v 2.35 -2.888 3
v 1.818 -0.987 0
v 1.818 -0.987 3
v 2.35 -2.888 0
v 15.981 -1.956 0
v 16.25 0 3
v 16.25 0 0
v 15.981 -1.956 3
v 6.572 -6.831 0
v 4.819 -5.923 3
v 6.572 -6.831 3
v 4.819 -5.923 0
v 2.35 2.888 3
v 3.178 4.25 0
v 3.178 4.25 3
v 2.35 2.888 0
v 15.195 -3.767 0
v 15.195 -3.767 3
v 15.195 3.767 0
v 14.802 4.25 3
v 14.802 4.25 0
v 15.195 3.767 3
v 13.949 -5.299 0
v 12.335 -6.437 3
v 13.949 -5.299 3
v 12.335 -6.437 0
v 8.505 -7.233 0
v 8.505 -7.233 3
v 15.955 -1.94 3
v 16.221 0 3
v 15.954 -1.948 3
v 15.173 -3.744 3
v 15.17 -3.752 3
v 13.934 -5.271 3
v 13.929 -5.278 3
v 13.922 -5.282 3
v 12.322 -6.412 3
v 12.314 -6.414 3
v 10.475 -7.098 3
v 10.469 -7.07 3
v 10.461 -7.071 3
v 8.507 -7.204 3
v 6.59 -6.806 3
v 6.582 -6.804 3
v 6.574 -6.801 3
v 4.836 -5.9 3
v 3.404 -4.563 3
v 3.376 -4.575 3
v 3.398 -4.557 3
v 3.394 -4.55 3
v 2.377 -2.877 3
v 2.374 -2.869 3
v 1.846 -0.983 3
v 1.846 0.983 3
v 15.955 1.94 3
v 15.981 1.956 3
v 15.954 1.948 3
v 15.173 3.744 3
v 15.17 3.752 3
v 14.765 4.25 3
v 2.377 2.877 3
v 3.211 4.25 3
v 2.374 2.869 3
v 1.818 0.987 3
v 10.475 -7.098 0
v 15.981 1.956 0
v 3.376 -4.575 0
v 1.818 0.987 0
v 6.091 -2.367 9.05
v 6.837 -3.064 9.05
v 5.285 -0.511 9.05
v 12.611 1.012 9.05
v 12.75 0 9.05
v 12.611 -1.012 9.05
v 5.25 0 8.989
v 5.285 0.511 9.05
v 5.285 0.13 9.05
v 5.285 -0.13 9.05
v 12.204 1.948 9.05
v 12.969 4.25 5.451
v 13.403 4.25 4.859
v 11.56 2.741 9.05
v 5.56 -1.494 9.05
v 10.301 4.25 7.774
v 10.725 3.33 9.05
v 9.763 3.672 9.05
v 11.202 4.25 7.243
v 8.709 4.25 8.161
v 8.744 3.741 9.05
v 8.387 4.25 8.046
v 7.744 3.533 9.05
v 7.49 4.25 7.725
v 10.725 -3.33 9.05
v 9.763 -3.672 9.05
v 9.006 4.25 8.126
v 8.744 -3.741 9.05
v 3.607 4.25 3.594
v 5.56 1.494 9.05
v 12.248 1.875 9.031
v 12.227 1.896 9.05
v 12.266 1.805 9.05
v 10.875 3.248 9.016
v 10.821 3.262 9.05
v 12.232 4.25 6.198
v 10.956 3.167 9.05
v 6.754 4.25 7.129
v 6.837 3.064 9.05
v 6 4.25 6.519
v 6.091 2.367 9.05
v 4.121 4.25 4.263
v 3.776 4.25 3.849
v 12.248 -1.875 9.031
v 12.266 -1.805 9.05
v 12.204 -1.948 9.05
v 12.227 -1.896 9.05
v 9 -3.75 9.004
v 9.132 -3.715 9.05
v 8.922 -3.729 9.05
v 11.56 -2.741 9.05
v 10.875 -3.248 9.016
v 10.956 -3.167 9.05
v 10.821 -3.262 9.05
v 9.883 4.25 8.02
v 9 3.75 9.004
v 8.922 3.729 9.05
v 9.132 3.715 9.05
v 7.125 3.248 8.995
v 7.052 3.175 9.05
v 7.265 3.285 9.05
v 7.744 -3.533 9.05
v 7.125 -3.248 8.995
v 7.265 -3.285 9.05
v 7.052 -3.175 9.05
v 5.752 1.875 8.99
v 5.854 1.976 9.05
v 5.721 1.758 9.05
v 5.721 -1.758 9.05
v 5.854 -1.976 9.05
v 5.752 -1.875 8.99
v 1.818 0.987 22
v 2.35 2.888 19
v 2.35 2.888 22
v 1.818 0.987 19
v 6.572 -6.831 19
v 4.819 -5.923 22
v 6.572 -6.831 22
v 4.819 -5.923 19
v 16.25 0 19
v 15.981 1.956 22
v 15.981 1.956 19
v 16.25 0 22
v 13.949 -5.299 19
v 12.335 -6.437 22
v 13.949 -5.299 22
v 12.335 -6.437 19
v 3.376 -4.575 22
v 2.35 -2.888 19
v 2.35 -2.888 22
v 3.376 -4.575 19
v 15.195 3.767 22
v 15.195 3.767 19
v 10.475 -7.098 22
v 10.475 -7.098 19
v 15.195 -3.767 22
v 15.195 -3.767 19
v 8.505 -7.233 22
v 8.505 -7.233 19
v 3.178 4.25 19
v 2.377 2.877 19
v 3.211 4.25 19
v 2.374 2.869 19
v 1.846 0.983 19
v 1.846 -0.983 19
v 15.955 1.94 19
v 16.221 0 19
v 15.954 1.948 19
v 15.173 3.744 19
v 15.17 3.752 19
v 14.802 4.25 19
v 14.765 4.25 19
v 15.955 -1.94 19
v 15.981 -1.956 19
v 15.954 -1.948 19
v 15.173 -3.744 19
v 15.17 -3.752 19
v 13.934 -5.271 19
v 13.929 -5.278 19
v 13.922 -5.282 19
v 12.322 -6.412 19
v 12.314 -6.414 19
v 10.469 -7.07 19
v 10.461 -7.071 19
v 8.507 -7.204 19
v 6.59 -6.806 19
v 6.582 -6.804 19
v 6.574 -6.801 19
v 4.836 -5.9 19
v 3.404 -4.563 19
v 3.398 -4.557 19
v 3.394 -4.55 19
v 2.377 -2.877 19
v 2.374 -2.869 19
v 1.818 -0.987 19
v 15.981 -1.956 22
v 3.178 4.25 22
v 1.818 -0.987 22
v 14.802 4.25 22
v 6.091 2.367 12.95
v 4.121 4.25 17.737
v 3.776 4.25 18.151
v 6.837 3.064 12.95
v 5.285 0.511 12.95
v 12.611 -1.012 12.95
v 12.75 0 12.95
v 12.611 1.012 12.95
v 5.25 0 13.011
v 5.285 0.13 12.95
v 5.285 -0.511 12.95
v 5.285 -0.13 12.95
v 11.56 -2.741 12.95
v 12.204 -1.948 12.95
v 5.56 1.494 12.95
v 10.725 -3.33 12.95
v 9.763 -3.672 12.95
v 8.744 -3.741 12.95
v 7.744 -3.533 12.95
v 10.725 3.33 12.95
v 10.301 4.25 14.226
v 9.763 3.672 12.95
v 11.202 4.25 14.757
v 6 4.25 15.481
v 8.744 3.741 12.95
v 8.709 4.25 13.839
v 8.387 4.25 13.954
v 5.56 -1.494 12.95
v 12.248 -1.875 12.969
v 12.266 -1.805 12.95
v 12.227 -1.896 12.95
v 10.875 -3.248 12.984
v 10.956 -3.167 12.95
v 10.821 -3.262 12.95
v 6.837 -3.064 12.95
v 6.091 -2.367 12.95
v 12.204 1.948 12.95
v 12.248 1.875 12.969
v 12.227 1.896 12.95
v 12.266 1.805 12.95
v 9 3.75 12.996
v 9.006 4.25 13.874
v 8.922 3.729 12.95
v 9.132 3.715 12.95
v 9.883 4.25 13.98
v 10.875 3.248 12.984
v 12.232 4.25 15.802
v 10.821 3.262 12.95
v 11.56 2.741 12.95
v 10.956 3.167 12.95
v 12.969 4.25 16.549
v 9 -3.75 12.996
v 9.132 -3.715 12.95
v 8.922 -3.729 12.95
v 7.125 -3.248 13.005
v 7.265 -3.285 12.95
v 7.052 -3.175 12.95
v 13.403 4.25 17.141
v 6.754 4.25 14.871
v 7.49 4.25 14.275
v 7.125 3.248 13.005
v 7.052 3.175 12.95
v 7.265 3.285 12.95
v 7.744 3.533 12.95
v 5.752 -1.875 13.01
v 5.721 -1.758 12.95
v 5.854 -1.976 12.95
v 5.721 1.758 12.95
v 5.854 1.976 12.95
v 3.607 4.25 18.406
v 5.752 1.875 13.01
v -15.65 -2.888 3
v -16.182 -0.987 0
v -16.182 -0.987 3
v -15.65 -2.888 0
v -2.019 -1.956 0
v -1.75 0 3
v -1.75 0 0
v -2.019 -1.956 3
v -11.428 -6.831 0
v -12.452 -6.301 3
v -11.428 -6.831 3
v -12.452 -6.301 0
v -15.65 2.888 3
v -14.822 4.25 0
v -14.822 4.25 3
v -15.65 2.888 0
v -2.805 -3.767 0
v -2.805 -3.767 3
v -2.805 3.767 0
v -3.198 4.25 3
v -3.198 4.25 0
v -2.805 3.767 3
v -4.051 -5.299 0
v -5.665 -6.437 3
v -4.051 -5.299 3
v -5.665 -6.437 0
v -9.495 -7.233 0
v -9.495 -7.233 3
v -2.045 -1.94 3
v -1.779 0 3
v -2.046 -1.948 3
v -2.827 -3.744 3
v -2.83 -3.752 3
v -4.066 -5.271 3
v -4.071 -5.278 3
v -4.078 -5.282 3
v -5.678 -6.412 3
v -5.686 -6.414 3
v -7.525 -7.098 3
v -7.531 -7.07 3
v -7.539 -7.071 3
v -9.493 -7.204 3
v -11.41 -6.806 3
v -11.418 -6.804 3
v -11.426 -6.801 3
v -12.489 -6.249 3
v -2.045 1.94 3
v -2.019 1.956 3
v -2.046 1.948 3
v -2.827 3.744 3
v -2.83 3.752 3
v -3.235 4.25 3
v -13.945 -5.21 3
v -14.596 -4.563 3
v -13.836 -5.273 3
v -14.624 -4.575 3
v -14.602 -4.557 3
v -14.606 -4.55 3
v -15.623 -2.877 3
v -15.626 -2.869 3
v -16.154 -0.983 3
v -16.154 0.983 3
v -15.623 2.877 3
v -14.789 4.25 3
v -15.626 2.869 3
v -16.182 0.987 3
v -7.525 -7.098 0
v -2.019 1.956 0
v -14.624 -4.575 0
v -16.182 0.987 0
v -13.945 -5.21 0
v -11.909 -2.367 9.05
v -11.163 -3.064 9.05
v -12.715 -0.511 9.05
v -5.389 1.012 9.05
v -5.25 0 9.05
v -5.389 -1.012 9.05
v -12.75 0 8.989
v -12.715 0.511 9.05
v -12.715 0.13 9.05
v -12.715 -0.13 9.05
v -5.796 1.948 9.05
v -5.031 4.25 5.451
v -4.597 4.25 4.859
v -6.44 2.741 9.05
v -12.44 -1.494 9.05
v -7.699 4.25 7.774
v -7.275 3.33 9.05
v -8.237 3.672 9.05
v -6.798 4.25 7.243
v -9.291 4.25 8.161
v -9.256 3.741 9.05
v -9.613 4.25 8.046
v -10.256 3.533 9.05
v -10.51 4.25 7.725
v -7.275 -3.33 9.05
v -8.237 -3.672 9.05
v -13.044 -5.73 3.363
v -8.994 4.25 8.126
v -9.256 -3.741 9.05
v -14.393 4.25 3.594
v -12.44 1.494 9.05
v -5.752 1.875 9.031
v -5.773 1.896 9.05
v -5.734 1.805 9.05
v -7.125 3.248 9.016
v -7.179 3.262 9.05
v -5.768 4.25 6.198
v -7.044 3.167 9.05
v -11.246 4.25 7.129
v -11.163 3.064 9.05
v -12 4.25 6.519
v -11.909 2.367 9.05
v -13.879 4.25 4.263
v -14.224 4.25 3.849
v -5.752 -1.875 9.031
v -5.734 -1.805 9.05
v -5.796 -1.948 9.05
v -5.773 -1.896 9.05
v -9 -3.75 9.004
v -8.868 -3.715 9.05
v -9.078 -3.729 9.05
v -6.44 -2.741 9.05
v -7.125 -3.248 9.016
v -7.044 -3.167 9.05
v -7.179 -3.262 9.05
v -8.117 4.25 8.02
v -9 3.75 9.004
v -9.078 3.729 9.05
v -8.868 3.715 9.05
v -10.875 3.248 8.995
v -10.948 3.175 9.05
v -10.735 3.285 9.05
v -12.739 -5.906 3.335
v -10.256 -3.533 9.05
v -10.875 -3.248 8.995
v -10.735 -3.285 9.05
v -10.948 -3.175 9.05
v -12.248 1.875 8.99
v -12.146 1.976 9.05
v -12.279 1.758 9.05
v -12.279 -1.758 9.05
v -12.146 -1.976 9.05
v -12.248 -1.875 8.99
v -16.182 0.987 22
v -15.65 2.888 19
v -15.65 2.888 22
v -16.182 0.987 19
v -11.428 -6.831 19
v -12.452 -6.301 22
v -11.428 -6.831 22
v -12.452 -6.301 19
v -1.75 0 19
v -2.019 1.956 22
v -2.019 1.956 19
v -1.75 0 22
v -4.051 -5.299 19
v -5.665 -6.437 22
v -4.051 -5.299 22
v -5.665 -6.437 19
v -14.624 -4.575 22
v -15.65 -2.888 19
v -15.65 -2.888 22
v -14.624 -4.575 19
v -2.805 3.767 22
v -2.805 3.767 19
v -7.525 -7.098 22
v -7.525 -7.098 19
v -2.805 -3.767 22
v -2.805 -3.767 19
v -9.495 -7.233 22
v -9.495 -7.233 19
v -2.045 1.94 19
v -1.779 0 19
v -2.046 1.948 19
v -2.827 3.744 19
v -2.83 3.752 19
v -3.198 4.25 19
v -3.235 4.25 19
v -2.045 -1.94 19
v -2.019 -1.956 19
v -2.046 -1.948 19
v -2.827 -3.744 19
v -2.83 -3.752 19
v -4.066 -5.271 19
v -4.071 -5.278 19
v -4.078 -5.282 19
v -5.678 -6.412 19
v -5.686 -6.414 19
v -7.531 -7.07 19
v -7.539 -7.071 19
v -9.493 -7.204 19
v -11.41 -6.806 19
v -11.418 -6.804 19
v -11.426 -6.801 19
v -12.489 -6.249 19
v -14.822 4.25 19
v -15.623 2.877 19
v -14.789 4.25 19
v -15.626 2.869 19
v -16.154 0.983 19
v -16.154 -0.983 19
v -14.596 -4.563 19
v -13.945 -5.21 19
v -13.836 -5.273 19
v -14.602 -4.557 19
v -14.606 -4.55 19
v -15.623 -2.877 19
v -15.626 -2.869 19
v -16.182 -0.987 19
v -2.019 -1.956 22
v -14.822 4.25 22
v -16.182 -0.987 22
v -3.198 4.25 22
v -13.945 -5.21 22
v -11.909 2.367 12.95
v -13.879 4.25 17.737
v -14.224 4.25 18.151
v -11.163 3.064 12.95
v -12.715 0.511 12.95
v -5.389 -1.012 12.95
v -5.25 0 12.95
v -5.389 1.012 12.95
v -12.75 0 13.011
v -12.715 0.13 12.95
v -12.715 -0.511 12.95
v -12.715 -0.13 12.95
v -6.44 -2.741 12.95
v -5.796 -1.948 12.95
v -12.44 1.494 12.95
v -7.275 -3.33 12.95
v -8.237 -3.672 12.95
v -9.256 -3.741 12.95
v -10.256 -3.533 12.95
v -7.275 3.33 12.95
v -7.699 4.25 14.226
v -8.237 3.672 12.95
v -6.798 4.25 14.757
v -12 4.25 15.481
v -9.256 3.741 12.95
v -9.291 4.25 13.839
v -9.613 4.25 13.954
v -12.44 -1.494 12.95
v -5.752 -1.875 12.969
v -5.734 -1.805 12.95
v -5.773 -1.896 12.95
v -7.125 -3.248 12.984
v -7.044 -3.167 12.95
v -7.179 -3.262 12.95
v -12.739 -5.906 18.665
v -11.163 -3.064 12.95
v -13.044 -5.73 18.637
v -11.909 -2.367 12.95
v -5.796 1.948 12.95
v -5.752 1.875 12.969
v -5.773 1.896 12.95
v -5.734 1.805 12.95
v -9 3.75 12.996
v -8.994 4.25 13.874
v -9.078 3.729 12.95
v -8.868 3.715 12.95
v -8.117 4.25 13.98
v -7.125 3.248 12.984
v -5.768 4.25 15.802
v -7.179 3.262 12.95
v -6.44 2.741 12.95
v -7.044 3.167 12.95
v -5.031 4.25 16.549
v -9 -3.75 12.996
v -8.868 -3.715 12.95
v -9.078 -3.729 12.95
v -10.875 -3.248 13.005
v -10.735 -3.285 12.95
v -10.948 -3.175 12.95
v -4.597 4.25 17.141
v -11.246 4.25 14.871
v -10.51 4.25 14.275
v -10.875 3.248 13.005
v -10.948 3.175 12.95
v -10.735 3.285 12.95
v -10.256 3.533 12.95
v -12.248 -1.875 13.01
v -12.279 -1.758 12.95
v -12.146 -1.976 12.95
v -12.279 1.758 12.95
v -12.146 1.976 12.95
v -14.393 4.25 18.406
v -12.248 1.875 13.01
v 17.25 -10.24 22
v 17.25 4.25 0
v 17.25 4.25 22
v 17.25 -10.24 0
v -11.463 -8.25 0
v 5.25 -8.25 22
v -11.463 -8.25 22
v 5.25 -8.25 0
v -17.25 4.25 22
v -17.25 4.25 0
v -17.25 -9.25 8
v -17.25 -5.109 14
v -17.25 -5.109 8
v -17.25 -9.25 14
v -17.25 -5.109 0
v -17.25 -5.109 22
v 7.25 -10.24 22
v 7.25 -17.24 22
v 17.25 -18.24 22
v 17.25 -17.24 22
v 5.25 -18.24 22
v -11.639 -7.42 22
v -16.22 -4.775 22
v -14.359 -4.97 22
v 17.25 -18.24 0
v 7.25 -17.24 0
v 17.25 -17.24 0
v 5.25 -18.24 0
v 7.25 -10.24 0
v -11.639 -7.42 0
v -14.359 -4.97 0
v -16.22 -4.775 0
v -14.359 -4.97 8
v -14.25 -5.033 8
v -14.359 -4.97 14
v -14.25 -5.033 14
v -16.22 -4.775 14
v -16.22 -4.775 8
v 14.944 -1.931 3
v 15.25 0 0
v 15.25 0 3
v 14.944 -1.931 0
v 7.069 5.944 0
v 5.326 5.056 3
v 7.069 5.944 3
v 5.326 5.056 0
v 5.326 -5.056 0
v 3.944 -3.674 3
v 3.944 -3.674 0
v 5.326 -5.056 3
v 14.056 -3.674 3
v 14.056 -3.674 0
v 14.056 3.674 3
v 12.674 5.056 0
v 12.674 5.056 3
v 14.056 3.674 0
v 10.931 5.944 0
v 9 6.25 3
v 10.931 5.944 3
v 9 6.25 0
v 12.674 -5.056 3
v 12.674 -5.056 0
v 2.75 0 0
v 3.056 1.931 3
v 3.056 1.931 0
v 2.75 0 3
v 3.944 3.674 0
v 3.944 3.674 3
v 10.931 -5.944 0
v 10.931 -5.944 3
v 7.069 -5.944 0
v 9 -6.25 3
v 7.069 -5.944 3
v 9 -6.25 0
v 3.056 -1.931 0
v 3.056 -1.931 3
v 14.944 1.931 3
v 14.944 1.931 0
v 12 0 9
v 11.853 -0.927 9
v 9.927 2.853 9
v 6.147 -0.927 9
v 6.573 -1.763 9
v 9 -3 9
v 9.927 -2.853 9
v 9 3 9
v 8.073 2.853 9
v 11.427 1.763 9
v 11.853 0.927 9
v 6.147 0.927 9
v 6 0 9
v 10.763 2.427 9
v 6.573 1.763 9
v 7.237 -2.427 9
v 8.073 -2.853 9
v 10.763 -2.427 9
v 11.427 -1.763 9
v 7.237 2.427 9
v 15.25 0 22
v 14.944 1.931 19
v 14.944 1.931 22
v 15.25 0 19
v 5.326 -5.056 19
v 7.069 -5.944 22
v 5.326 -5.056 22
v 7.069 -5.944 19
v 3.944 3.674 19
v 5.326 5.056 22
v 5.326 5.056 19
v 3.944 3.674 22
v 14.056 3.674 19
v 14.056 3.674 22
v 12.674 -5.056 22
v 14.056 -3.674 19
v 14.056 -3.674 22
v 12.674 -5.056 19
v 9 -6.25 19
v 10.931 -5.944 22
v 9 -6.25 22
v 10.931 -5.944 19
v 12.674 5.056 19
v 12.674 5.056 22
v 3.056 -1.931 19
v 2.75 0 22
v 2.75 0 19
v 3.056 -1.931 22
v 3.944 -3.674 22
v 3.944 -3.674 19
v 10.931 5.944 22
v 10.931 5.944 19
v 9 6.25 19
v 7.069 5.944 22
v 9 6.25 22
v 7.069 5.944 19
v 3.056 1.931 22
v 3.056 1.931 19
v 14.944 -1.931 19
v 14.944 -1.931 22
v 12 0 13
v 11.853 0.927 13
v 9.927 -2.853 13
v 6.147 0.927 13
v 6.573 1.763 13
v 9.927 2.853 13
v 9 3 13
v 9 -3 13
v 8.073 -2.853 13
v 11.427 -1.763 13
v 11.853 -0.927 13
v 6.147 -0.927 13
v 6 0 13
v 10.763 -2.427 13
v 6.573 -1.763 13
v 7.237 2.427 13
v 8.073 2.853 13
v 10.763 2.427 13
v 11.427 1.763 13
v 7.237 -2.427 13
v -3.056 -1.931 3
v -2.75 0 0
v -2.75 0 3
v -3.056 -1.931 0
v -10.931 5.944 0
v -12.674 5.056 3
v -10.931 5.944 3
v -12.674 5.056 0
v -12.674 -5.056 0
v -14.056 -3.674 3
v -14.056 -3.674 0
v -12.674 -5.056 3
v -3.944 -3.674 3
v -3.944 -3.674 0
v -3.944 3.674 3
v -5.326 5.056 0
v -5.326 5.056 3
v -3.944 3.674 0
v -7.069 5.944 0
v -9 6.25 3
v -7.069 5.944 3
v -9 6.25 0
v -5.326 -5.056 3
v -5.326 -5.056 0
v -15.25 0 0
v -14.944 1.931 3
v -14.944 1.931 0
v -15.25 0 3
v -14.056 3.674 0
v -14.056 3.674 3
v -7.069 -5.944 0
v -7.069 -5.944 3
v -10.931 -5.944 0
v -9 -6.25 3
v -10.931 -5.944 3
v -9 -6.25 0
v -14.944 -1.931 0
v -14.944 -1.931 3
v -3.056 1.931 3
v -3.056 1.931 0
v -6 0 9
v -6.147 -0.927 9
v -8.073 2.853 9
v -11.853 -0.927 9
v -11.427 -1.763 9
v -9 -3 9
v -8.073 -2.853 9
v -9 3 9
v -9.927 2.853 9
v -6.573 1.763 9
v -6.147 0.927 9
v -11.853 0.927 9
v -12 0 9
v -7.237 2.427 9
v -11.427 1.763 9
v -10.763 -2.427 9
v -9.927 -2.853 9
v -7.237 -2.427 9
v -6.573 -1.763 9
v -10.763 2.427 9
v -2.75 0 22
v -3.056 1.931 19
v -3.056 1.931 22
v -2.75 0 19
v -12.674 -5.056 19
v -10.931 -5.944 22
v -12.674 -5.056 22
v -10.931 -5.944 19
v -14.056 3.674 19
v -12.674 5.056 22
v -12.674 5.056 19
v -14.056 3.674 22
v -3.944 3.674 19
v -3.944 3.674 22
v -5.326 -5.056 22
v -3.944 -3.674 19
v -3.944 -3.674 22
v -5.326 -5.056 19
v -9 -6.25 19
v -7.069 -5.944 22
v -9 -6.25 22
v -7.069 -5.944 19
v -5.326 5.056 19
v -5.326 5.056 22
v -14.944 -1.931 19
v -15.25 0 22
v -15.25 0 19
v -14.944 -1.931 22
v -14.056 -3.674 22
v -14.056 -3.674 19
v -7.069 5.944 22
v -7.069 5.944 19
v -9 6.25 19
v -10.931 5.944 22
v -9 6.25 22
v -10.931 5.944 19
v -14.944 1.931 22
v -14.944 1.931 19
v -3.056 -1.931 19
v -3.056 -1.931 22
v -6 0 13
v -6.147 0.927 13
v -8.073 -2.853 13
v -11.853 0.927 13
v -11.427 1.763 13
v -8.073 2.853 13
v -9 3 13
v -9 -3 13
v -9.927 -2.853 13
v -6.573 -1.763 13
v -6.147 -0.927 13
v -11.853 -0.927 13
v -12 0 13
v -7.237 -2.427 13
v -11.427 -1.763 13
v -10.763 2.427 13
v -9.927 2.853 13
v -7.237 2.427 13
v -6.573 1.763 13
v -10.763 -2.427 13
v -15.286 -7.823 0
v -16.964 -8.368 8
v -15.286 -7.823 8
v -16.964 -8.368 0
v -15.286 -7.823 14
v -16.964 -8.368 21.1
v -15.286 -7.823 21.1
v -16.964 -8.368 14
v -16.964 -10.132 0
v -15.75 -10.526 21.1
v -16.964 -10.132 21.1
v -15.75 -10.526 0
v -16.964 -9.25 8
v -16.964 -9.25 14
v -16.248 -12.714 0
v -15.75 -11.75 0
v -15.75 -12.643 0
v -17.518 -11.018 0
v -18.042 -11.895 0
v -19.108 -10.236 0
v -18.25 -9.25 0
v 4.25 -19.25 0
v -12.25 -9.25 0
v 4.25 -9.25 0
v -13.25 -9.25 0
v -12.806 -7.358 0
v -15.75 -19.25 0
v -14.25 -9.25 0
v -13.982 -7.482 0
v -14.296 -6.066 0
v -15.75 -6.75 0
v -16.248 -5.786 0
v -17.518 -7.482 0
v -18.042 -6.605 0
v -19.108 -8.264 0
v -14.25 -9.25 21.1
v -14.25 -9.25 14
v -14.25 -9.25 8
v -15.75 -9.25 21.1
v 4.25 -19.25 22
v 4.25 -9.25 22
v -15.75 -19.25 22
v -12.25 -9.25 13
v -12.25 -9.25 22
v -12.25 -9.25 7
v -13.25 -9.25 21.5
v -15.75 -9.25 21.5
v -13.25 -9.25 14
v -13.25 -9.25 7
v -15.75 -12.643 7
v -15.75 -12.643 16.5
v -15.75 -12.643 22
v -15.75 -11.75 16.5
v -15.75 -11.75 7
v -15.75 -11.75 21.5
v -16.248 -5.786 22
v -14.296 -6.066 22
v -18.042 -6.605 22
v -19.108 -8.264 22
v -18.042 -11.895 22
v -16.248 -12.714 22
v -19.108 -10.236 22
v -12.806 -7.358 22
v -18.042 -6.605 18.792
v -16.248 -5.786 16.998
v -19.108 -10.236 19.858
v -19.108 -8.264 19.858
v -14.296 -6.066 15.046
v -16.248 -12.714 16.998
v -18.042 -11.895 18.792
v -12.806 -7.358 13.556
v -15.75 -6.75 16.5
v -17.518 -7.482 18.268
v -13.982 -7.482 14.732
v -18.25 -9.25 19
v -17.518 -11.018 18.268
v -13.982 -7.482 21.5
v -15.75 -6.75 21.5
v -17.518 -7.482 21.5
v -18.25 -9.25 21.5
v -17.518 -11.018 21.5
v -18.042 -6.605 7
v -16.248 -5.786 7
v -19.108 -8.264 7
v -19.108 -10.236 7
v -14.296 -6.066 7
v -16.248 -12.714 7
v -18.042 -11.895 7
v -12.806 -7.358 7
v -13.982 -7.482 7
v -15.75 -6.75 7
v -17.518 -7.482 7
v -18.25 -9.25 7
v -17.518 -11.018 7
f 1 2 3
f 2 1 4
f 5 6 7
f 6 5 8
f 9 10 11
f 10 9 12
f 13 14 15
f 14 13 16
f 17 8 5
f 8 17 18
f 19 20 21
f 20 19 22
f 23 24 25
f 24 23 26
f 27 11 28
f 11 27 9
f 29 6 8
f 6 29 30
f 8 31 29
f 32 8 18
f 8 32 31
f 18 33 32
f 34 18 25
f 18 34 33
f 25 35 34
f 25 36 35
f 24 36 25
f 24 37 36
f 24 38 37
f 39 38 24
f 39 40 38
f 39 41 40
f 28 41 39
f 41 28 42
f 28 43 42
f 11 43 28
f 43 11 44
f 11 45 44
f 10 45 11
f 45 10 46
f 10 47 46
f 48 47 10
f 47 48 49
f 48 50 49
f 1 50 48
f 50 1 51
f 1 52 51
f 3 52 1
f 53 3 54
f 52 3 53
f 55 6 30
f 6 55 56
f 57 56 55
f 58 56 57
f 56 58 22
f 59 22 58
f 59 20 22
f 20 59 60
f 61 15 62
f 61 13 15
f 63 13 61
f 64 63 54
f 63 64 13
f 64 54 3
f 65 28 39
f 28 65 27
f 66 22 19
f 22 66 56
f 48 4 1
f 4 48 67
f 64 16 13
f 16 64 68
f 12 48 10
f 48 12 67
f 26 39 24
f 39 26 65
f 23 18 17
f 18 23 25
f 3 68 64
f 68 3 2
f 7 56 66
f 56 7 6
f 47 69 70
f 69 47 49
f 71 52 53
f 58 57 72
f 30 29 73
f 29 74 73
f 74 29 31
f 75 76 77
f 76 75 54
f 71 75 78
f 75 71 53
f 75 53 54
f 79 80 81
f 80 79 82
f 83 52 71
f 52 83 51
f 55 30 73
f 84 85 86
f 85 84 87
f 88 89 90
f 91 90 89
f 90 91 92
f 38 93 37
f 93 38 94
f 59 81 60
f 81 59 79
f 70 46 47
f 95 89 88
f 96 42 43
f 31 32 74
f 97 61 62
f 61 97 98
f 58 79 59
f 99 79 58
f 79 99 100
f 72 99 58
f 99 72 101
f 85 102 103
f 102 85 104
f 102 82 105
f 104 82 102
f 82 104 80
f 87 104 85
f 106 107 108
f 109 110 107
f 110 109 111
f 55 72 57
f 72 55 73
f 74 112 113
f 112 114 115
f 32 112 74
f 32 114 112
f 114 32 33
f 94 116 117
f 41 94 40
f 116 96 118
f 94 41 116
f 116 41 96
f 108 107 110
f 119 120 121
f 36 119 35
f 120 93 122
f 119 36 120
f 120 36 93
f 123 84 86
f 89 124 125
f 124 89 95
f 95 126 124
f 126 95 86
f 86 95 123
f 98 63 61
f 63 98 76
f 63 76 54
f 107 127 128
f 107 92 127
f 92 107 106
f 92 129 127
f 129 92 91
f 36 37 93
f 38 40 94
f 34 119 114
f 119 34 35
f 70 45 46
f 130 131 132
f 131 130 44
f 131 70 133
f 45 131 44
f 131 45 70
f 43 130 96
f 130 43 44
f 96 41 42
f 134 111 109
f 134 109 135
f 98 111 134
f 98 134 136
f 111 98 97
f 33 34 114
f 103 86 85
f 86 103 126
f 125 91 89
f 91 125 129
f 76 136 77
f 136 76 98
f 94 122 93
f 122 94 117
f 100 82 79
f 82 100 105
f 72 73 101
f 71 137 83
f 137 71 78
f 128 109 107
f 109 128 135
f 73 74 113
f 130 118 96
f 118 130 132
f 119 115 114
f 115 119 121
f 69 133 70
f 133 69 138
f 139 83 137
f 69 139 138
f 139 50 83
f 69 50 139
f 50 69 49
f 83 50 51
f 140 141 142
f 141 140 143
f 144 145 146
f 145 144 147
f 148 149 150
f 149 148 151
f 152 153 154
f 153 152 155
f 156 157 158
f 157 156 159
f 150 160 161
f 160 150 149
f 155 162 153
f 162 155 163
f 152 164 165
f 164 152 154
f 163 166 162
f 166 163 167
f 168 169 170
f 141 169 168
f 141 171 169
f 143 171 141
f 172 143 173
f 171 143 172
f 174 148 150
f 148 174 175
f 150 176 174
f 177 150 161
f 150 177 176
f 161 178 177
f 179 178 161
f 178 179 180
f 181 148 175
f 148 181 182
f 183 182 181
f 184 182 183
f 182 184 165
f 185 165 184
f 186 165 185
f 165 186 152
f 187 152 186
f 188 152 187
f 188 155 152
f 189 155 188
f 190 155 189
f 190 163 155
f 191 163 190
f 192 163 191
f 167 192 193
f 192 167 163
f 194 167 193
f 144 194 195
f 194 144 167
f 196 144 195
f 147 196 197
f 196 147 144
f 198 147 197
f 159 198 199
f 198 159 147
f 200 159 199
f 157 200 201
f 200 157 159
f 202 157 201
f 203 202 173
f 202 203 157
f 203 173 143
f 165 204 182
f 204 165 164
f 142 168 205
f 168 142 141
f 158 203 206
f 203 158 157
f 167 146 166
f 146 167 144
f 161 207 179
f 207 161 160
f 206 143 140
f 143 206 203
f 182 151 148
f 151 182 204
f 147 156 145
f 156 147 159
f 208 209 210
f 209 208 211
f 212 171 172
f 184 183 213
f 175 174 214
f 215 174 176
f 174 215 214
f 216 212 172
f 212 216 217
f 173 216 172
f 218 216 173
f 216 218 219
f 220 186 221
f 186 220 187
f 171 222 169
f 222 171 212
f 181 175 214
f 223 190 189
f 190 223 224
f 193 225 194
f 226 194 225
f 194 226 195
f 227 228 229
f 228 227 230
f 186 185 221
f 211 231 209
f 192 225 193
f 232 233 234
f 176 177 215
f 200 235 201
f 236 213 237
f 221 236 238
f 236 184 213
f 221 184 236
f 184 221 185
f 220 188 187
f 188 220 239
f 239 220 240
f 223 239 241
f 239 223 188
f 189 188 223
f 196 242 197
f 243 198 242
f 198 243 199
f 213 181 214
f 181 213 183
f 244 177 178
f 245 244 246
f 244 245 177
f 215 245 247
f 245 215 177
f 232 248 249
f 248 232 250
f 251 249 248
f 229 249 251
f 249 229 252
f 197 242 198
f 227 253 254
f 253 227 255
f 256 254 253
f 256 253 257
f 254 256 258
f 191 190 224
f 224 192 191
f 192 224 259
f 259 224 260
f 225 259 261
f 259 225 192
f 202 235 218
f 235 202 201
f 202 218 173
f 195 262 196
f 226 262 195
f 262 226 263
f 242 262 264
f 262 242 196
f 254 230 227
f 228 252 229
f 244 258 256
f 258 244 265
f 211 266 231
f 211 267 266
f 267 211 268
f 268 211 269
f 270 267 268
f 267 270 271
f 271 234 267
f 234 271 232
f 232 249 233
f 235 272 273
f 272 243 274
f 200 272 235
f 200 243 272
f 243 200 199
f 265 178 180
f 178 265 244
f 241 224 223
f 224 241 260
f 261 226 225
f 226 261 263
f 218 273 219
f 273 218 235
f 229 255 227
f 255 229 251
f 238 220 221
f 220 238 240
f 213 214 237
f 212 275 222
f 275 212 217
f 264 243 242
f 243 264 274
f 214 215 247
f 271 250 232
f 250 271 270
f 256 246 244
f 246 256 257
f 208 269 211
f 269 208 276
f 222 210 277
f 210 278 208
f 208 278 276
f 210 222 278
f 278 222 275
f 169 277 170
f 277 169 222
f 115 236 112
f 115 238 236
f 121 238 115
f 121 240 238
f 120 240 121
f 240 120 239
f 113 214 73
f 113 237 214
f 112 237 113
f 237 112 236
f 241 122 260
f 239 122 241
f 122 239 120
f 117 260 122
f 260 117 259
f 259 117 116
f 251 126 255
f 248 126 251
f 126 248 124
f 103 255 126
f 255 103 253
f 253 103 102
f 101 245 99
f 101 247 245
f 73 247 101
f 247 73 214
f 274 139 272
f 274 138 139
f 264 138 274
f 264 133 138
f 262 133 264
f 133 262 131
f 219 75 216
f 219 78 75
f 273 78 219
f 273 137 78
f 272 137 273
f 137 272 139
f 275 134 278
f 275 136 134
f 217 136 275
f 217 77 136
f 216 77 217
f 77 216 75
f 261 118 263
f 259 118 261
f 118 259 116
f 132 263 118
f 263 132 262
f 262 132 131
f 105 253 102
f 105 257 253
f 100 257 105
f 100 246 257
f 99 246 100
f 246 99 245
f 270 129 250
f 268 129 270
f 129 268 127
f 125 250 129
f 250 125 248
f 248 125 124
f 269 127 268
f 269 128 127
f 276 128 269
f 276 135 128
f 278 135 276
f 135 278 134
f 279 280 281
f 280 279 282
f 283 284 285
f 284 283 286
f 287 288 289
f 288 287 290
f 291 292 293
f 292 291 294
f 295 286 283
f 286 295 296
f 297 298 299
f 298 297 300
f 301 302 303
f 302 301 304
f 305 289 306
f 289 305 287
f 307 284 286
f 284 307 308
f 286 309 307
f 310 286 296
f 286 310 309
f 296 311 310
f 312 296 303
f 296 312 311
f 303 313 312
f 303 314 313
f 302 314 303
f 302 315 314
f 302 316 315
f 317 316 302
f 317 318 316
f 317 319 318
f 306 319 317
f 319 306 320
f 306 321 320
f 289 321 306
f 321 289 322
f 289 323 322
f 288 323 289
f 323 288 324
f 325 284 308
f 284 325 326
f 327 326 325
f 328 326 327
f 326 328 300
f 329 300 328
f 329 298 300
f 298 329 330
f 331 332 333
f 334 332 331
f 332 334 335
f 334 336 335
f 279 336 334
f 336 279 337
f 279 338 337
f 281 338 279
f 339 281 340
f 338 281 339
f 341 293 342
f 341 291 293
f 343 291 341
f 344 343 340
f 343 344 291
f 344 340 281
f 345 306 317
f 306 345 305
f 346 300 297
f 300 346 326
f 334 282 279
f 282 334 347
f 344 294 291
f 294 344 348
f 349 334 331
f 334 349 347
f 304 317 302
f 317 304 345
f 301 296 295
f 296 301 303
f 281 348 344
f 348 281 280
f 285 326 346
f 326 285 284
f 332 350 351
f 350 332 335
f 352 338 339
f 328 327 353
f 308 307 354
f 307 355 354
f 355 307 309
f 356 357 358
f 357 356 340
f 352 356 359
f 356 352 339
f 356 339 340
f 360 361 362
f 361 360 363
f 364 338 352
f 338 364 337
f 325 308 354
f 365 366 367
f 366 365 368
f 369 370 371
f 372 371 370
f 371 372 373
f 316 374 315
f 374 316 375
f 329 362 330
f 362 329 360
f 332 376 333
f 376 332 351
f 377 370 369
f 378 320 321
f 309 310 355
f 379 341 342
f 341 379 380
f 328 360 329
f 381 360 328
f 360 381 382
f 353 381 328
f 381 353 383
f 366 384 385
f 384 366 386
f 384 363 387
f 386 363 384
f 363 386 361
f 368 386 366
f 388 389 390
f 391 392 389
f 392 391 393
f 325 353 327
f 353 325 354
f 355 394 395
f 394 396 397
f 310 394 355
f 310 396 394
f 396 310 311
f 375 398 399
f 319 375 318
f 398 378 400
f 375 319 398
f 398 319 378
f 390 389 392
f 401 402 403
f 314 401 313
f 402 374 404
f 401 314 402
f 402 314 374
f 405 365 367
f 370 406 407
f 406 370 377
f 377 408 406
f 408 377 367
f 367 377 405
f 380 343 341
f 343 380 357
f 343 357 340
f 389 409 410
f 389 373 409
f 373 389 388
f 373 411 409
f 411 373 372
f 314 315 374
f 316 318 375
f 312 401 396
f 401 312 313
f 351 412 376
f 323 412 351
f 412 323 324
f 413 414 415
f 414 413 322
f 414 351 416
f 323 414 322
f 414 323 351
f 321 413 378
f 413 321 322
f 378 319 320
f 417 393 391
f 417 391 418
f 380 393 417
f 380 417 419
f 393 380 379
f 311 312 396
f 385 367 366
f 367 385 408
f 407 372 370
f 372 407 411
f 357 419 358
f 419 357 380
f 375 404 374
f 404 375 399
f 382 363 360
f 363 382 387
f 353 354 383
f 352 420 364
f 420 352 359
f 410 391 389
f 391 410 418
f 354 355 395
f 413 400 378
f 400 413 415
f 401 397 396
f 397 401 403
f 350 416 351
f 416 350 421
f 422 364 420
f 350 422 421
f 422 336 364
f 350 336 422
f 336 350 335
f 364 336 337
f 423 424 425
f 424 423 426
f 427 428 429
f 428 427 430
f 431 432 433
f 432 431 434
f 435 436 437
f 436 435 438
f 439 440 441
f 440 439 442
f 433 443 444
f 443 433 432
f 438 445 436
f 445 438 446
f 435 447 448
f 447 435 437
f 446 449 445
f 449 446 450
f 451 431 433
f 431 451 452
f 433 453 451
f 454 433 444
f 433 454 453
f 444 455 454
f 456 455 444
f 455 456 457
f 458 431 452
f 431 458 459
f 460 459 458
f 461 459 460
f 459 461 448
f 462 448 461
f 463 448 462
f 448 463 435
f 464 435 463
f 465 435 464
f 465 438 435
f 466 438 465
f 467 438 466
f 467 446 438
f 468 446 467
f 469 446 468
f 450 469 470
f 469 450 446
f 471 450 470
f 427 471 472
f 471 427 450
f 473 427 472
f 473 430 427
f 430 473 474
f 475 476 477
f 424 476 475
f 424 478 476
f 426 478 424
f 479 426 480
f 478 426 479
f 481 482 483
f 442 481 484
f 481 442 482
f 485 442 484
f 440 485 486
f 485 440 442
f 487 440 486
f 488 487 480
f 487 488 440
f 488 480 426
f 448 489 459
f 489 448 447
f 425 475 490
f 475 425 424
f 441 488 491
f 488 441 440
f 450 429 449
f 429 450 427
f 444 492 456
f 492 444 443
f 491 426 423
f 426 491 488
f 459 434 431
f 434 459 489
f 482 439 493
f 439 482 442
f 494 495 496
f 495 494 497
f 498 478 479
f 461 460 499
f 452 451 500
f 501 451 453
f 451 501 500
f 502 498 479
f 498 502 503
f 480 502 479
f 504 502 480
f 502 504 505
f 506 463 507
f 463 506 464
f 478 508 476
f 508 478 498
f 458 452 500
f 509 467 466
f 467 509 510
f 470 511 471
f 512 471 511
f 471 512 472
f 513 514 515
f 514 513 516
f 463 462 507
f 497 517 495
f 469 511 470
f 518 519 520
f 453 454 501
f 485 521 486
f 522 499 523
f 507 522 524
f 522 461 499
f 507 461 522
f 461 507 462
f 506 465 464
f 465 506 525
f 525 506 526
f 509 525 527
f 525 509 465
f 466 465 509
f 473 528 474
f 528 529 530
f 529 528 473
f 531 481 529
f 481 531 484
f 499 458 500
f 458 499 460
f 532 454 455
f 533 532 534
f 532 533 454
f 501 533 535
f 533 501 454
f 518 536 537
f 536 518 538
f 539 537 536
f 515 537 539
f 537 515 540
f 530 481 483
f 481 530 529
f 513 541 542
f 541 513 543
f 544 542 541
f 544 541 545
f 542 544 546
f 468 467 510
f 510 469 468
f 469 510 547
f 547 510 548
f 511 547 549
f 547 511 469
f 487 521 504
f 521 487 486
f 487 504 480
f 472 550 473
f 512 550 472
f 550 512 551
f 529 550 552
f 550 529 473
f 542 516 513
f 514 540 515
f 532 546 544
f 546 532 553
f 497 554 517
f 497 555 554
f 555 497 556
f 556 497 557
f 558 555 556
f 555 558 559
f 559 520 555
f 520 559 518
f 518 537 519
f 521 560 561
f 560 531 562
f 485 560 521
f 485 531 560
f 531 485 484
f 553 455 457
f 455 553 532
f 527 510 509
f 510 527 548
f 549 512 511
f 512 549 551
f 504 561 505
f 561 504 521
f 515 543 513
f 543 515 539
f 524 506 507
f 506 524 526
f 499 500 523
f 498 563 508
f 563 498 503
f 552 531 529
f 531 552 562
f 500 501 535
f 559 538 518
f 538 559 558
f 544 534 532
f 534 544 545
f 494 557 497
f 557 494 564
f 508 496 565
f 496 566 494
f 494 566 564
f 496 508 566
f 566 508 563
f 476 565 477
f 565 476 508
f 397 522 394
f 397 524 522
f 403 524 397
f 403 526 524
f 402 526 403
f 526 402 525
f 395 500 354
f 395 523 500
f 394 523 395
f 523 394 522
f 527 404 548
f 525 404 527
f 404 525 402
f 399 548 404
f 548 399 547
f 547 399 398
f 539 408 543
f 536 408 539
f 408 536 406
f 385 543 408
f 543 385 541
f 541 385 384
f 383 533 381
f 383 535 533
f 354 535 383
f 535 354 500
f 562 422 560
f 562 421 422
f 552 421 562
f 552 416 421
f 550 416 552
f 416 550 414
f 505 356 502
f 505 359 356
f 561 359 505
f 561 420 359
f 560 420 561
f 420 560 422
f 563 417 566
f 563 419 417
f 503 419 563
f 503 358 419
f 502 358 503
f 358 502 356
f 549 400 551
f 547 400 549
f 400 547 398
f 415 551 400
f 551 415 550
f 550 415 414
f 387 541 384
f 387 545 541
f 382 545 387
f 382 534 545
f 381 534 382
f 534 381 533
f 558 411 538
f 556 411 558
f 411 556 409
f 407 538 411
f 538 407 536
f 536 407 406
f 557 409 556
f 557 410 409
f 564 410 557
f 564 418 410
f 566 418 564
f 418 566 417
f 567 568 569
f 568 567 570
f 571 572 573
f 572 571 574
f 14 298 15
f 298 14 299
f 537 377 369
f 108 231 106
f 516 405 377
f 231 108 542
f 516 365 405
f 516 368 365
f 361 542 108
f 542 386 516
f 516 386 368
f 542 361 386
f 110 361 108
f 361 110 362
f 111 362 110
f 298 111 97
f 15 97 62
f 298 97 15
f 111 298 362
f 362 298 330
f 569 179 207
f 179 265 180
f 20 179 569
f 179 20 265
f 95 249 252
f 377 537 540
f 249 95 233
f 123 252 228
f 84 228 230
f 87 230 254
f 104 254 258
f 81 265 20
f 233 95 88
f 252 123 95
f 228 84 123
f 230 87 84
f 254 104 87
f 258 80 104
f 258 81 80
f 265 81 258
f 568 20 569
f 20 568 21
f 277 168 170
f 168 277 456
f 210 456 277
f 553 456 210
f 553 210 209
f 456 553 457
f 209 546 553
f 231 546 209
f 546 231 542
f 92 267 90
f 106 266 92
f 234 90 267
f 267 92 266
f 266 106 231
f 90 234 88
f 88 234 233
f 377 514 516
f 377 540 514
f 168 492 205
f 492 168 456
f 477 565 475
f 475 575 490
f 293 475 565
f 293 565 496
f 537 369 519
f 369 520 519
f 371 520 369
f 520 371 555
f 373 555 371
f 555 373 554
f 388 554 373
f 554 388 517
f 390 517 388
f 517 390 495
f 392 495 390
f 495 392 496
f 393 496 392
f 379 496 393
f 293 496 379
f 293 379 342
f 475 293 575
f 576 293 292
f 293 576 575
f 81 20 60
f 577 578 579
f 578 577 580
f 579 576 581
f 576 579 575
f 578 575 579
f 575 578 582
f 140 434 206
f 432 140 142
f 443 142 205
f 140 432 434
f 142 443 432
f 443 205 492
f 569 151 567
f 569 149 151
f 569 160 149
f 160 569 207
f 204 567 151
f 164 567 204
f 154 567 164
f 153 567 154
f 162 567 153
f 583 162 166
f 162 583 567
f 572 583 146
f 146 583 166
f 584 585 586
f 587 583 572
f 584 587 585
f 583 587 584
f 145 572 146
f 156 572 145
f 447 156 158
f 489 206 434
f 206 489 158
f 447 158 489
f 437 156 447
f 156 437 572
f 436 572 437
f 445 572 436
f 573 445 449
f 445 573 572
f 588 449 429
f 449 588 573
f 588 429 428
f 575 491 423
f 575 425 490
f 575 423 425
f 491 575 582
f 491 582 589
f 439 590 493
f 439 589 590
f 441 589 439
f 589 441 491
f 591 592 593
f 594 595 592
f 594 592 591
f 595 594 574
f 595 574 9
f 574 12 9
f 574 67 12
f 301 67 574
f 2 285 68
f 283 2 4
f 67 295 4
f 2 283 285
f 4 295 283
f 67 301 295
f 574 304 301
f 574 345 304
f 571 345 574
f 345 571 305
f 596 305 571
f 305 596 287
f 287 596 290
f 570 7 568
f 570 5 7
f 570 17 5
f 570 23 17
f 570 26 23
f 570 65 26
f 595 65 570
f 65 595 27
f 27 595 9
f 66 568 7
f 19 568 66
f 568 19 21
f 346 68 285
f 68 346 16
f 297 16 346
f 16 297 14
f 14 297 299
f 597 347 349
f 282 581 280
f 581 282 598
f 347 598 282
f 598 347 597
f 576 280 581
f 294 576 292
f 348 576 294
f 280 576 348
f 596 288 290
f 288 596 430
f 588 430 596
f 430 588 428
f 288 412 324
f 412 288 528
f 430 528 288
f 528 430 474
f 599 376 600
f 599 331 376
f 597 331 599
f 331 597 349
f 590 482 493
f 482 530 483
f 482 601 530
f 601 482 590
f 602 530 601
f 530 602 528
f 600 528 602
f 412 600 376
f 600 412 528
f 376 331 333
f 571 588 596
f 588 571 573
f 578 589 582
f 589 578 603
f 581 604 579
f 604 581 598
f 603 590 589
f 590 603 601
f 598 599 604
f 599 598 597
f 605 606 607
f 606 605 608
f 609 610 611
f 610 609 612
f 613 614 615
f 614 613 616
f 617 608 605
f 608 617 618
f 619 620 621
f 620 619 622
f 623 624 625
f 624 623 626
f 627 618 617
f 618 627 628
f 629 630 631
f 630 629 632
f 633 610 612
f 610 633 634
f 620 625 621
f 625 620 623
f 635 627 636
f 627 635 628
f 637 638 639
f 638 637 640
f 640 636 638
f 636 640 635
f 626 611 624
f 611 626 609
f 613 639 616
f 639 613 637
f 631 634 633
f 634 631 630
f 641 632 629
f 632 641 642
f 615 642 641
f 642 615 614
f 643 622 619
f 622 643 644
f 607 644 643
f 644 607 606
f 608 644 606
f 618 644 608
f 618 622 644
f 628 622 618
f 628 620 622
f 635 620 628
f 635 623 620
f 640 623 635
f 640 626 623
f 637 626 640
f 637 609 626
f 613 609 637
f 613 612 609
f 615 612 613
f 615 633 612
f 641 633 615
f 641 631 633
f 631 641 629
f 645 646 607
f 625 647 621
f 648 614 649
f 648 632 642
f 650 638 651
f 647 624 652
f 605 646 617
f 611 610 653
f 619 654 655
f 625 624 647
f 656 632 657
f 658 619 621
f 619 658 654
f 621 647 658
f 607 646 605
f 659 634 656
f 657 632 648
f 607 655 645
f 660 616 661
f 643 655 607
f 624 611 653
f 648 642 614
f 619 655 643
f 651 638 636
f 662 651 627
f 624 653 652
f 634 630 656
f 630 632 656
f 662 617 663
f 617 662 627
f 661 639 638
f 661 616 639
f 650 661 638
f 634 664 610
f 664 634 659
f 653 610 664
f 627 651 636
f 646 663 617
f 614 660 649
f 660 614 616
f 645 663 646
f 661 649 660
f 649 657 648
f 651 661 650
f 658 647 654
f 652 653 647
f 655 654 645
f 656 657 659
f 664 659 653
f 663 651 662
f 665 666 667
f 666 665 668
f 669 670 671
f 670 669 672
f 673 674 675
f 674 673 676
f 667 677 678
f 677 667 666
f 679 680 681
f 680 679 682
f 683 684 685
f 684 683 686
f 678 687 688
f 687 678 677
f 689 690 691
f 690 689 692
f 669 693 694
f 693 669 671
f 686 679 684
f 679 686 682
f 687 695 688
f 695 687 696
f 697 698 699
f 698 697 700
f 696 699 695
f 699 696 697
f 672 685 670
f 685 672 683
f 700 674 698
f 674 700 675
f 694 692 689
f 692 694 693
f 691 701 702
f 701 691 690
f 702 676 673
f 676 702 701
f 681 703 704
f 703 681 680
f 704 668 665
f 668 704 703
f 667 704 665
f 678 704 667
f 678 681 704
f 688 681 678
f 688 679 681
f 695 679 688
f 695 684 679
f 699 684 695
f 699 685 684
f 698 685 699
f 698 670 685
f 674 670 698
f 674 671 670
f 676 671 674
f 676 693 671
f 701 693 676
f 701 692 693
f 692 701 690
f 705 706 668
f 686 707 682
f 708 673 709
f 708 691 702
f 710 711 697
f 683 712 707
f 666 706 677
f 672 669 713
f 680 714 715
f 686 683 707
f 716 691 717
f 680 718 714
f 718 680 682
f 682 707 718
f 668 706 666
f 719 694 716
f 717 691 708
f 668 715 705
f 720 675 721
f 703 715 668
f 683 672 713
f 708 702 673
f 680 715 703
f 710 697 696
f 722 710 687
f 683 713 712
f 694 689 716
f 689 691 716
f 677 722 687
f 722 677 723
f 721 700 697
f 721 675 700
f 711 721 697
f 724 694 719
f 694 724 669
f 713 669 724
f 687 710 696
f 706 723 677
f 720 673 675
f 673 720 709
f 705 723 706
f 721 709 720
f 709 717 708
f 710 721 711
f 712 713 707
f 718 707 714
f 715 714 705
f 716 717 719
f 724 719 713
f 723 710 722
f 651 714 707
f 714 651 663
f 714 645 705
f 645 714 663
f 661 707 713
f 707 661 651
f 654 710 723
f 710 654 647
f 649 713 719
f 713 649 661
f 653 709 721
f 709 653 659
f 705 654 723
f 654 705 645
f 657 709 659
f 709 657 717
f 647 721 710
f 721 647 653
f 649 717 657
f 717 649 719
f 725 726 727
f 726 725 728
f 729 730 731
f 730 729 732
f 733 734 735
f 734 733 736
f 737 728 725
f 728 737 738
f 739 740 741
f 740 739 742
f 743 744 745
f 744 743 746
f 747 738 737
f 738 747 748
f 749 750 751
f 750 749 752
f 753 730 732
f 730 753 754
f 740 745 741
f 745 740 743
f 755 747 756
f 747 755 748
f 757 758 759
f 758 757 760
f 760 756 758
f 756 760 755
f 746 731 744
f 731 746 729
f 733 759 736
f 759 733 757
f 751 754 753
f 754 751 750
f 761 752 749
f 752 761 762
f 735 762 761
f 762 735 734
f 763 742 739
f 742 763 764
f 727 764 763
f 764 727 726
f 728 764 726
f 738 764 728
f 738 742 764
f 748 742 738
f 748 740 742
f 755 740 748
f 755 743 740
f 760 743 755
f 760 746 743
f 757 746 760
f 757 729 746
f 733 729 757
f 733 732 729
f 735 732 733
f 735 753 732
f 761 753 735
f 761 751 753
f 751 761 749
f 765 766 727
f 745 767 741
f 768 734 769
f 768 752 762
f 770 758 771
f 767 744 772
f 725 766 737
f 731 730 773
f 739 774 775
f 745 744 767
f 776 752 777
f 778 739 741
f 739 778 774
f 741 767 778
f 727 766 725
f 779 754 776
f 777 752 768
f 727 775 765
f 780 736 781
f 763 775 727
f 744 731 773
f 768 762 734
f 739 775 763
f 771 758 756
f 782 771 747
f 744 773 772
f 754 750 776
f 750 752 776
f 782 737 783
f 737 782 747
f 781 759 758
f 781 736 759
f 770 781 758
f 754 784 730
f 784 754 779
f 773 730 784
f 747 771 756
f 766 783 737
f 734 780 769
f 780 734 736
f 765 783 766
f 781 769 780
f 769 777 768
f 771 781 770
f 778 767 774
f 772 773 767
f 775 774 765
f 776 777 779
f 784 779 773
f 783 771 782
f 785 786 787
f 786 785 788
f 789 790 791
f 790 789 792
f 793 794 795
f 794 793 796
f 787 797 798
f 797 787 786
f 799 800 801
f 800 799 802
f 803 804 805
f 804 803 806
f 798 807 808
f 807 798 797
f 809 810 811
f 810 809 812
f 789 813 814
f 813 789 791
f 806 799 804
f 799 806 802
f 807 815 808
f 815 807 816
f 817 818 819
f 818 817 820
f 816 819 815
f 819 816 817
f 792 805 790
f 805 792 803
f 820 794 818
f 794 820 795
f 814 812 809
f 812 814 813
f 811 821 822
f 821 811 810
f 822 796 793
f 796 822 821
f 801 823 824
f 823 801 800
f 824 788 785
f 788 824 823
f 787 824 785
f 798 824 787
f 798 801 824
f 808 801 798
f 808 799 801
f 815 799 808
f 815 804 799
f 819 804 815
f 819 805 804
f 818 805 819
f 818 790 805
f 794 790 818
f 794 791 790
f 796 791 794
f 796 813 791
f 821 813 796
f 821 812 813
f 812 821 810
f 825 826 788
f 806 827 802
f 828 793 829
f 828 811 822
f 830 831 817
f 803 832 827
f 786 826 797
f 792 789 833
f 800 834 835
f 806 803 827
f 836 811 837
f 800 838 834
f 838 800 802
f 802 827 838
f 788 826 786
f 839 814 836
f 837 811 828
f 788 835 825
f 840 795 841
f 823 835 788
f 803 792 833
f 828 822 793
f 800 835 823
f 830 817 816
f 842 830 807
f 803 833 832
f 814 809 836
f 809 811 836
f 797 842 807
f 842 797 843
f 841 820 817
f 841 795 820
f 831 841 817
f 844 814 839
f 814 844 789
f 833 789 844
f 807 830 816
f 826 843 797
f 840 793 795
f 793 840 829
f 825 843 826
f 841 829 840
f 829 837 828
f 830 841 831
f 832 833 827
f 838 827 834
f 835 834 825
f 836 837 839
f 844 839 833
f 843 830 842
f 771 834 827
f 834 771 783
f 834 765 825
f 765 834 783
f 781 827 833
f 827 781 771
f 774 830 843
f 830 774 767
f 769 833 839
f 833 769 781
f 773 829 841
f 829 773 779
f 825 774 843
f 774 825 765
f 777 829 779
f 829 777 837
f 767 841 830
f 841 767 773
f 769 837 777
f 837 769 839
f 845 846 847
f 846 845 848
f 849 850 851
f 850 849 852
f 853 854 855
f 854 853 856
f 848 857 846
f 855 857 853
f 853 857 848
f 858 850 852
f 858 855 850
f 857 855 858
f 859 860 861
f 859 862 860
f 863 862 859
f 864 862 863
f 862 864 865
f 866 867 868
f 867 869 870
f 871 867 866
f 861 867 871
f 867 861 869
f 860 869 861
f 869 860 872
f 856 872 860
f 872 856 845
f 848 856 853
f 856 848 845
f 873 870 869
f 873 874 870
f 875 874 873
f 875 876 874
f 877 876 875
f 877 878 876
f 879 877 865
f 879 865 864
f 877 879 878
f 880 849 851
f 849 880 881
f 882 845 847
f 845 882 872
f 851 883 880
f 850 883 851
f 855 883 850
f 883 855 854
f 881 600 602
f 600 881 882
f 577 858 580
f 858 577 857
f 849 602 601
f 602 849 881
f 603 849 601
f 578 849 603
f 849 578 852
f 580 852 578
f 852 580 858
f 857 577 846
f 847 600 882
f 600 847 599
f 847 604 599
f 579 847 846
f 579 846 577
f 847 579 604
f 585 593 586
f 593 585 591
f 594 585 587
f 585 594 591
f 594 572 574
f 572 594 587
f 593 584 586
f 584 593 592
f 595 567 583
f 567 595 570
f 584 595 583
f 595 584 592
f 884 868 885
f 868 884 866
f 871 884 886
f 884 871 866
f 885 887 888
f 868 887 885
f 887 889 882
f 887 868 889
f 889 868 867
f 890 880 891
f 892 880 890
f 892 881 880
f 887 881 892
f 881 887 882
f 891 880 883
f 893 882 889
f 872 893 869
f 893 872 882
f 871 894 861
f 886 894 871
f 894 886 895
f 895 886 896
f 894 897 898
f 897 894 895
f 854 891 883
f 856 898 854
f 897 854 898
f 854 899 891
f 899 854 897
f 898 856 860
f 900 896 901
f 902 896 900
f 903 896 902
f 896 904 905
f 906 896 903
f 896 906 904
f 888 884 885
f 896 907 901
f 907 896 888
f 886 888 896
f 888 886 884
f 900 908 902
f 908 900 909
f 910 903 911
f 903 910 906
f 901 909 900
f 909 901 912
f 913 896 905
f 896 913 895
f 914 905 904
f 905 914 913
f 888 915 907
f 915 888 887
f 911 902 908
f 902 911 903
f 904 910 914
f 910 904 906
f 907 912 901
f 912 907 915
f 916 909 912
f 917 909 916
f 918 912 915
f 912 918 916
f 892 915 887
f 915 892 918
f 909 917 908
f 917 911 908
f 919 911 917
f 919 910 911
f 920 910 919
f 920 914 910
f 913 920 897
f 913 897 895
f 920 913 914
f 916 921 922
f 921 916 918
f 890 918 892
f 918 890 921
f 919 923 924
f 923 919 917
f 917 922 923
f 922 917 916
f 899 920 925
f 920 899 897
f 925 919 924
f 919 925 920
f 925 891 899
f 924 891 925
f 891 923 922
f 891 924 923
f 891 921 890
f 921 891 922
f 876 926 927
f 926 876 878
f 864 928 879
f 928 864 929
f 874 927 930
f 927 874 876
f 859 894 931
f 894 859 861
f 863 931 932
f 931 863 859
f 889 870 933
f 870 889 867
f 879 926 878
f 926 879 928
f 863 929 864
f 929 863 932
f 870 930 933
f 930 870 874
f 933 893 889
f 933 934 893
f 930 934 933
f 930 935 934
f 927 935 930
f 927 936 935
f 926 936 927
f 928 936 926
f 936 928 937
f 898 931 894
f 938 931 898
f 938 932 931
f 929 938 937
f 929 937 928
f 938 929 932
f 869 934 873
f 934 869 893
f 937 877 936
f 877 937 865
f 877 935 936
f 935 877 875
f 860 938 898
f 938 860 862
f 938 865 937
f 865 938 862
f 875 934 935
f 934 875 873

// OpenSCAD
// Tiny Toy Dump Truck
// No support needed, no assembly required (*)
// (*) some cleanup will probably be necessary, however
// Created by: Madscifi
// License - Public domain
// Inspired by (but not really derived from)
// toy tanker truck by jag (thingiverse thing:5273)

// Sliced with Skeinforge using:
//  0.2mm - Layer Thickness
//  2.5 - Perimeter Width over Thickness (ratio)

// V3 modified bed axle so that the bed does not slide so far off the truck 
// when it is raised.

// V2	moved support_width definition to the start of the script, and fixed the positioning of the cab
//	so it is positioned correctly in the case that wheel_dia or bed_lift is modified.
//	As delivered, this version prints essentially the same as the previous version unless
//	you modify wheel_dia or bed_lift.

wheel_dia=12.5;
wheel_flat_thickness=3;
wheel_conic_dist=6;
wheel_base_dist=18;
wheel_cutout_extra=1;
axle_cutout=0.75;
axle_dia=6;
axle_len=4;
body_lift=2;
bed_axle_dia=3;
bed_axle_cutout=1;
bed_axle_bearing_extra=1;
bed_height=10;
bed_len=20;
bed_wall=2.5;
bed_axle_bearing_wall=1;
bed_bearing_cutout=1;
bed_axle_cover_height = 0.5;
bed_axle_cover_clearance = 0.4;
bed_axle_short = bed_axle_cover_height + bed_axle_cover_clearance;
cab_sep=1;
cab_wall=2;
cab_roof=1;
support_width=6;

width=wheel_flat_thickness*2+wheel_conic_dist*2+axle_len;
length=wheel_base_dist+wheel_dia+wheel_cutout_extra*4;
bearing_dia=bed_axle_dia+bed_axle_cutout*2+bed_axle_bearing_wall*2;

// If you change the size of things this is the one value that is 
// completely emperical - you'll probably need to tweek this.
bed_axle_slice_offset=-width/4+support_width/2+bed_axle_cutout*2.5;

module hslogo() {
  // Scale to be 1 unit long
  scale([1/80,1/80,1]) {
    difference() {
      color("green") linear_extrude(height=1) import("hslogo-base.dxf");
      color("yellow") translate([0,0,-0.01]) linear_extrude(height=0.2) import("hslogo-detail.dxf");
    }
  }
}

module wheel(extra,aextra)
{
	union()
	{
		translate([0,0,wheel_conic_dist]) cylinder(h=wheel_flat_thickness+extra,r=wheel_dia/2+extra);
		translate([0,0,-extra/20]) cylinder(h=wheel_conic_dist+extra/10,r1=axle_dia/2+aextra,r2=wheel_dia/2+extra);
	}
}
module axle(extra,aextra)
{
	union()
	{
		translate([0,-axle_len/2,0]) rotate([90,0,0]) wheel(extra,aextra);
		translate([0,axle_len/2,0]) rotate([-90,0,0]) wheel(extra,aextra);
		translate([0,axle_len/2+0.1,0]) rotate([90,0,0]) cylinder(h=axle_len+0.2,r=axle_dia/2+aextra);
	}
}


module bed()
{
	cutout_dia = bed_axle_dia+bed_axle_cutout*2;
	bearing_len=width/2-support_width/2-bed_axle_cutout;

	union()
	{
		difference()
		{
			translate([bed_len/2,0,bed_height/2]) 
				cube([bed_len,width,bed_height],center=true);
            rotate([0, 0, 270])
            translate([0, bed_len/4, bed_height*0.9+0.001])
            scale([bed_len, bed_len, bed_height*0.1])
            translate([-0.5, 0, 0])
			//translate([bed_len/2,0,bed_height/2+bed_axle_dia/2]) 
				//cube([bed_len-bed_wall,width-bed_wall,bed_height-bed_wall],center=true);
            hslogo()
			rotate([90,0,0]) cylinder(h=width+0.01,r=cutout_dia/2,center=true);
		}
		difference()
		{
			translate([0, width/4,0]) 
			difference()
			{
				rotate([90,0,0]) cylinder( h=width/2,r=bearing_dia/2,center=true);
				translate([0,bed_axle_slice_offset,0]) 
					rotate([0,0,45]) translate([-50,0,0]) 
						cube([100,100,100],center=true);
			}
			translate([0,-bed_axle_cover_height,0])
			    rotate([90,0,0]) 
                                      cylinder( h=width, r=cutout_dia/2, center=true);
			
		}
		difference()
		{
			translate([0, -bearing_len/2-support_width/2-bed_axle_cutout,0]) 
				rotate([90,0,0]) 
					cylinder( h=bearing_len,r=bearing_dia/2,center=true);
			rotate([90,0,0]) cylinder( h=width+0.2, r=cutout_dia/2, center=true);
		}
	}
}

module bed_axle()
{
	union()
	{
		translate([0,-bed_axle_short/2,0])
		    rotate([90,0,0]) 
          	        cylinder(h=width-bed_axle_short,r=bed_axle_dia/2,center=true);
		translate([0,0,-bed_axle_dia]) cube([bed_axle_dia,6,bed_axle_dia*2],center=true);
	}
}

module bed_axle_cutout()
{
	rotate([90,0,0]) cylinder(h=width+0.1,r=bearing_dia/2+bed_bearing_cutout,center=true);
}

module cab()
{
	translate([-(length-bed_len-bed_axle_dia/2-cab_sep)/2,0,bed_height/2])
	difference()
	{
		cube([length-bed_len-bed_axle_dia/2-cab_sep,width,bed_height],center=true);
		translate([cab_wall,0,(cab_wall-cab_roof)/2]) cube([length-bed_len-bed_axle_dia/2-cab_sep,width+0.1,bed_height-cab_wall-cab_roof],center=true);
	}
}

translate([0,0,width/2])
rotate([90,0,0])
{
	union()
	{
		// body
		difference()
		{
			translate([0,0,body_lift]) cube([length,width,wheel_dia],center=true);
			translate([wheel_base_dist/2,0,0]) axle(wheel_cutout_extra,axle_cutout);
			translate([-wheel_base_dist/2,0,0]) axle(wheel_cutout_extra,axle_cutout);
			translate([-length/2+bed_axle_dia/2,0,wheel_dia/2+body_lift+1]) bed_axle_cutout();
		}
		
		// wheels and axles
		translate([wheel_base_dist/2,0,0]) axle(0,0);
		translate([-wheel_base_dist/2,0,0]) axle(0,0);
	
		// bed
		translate([-length/2+bed_axle_dia/2,0,wheel_dia/2+body_lift+1]) 
		{
			bed_axle();
		}
	
		// cab
		translate([(length/2),0,wheel_dia/2+body_lift-0.01]) cab();
		translate([-length/2+bed_axle_dia/2,0,wheel_dia/2+body_lift+1]) 
		{
			bed();
		}
	}
}
